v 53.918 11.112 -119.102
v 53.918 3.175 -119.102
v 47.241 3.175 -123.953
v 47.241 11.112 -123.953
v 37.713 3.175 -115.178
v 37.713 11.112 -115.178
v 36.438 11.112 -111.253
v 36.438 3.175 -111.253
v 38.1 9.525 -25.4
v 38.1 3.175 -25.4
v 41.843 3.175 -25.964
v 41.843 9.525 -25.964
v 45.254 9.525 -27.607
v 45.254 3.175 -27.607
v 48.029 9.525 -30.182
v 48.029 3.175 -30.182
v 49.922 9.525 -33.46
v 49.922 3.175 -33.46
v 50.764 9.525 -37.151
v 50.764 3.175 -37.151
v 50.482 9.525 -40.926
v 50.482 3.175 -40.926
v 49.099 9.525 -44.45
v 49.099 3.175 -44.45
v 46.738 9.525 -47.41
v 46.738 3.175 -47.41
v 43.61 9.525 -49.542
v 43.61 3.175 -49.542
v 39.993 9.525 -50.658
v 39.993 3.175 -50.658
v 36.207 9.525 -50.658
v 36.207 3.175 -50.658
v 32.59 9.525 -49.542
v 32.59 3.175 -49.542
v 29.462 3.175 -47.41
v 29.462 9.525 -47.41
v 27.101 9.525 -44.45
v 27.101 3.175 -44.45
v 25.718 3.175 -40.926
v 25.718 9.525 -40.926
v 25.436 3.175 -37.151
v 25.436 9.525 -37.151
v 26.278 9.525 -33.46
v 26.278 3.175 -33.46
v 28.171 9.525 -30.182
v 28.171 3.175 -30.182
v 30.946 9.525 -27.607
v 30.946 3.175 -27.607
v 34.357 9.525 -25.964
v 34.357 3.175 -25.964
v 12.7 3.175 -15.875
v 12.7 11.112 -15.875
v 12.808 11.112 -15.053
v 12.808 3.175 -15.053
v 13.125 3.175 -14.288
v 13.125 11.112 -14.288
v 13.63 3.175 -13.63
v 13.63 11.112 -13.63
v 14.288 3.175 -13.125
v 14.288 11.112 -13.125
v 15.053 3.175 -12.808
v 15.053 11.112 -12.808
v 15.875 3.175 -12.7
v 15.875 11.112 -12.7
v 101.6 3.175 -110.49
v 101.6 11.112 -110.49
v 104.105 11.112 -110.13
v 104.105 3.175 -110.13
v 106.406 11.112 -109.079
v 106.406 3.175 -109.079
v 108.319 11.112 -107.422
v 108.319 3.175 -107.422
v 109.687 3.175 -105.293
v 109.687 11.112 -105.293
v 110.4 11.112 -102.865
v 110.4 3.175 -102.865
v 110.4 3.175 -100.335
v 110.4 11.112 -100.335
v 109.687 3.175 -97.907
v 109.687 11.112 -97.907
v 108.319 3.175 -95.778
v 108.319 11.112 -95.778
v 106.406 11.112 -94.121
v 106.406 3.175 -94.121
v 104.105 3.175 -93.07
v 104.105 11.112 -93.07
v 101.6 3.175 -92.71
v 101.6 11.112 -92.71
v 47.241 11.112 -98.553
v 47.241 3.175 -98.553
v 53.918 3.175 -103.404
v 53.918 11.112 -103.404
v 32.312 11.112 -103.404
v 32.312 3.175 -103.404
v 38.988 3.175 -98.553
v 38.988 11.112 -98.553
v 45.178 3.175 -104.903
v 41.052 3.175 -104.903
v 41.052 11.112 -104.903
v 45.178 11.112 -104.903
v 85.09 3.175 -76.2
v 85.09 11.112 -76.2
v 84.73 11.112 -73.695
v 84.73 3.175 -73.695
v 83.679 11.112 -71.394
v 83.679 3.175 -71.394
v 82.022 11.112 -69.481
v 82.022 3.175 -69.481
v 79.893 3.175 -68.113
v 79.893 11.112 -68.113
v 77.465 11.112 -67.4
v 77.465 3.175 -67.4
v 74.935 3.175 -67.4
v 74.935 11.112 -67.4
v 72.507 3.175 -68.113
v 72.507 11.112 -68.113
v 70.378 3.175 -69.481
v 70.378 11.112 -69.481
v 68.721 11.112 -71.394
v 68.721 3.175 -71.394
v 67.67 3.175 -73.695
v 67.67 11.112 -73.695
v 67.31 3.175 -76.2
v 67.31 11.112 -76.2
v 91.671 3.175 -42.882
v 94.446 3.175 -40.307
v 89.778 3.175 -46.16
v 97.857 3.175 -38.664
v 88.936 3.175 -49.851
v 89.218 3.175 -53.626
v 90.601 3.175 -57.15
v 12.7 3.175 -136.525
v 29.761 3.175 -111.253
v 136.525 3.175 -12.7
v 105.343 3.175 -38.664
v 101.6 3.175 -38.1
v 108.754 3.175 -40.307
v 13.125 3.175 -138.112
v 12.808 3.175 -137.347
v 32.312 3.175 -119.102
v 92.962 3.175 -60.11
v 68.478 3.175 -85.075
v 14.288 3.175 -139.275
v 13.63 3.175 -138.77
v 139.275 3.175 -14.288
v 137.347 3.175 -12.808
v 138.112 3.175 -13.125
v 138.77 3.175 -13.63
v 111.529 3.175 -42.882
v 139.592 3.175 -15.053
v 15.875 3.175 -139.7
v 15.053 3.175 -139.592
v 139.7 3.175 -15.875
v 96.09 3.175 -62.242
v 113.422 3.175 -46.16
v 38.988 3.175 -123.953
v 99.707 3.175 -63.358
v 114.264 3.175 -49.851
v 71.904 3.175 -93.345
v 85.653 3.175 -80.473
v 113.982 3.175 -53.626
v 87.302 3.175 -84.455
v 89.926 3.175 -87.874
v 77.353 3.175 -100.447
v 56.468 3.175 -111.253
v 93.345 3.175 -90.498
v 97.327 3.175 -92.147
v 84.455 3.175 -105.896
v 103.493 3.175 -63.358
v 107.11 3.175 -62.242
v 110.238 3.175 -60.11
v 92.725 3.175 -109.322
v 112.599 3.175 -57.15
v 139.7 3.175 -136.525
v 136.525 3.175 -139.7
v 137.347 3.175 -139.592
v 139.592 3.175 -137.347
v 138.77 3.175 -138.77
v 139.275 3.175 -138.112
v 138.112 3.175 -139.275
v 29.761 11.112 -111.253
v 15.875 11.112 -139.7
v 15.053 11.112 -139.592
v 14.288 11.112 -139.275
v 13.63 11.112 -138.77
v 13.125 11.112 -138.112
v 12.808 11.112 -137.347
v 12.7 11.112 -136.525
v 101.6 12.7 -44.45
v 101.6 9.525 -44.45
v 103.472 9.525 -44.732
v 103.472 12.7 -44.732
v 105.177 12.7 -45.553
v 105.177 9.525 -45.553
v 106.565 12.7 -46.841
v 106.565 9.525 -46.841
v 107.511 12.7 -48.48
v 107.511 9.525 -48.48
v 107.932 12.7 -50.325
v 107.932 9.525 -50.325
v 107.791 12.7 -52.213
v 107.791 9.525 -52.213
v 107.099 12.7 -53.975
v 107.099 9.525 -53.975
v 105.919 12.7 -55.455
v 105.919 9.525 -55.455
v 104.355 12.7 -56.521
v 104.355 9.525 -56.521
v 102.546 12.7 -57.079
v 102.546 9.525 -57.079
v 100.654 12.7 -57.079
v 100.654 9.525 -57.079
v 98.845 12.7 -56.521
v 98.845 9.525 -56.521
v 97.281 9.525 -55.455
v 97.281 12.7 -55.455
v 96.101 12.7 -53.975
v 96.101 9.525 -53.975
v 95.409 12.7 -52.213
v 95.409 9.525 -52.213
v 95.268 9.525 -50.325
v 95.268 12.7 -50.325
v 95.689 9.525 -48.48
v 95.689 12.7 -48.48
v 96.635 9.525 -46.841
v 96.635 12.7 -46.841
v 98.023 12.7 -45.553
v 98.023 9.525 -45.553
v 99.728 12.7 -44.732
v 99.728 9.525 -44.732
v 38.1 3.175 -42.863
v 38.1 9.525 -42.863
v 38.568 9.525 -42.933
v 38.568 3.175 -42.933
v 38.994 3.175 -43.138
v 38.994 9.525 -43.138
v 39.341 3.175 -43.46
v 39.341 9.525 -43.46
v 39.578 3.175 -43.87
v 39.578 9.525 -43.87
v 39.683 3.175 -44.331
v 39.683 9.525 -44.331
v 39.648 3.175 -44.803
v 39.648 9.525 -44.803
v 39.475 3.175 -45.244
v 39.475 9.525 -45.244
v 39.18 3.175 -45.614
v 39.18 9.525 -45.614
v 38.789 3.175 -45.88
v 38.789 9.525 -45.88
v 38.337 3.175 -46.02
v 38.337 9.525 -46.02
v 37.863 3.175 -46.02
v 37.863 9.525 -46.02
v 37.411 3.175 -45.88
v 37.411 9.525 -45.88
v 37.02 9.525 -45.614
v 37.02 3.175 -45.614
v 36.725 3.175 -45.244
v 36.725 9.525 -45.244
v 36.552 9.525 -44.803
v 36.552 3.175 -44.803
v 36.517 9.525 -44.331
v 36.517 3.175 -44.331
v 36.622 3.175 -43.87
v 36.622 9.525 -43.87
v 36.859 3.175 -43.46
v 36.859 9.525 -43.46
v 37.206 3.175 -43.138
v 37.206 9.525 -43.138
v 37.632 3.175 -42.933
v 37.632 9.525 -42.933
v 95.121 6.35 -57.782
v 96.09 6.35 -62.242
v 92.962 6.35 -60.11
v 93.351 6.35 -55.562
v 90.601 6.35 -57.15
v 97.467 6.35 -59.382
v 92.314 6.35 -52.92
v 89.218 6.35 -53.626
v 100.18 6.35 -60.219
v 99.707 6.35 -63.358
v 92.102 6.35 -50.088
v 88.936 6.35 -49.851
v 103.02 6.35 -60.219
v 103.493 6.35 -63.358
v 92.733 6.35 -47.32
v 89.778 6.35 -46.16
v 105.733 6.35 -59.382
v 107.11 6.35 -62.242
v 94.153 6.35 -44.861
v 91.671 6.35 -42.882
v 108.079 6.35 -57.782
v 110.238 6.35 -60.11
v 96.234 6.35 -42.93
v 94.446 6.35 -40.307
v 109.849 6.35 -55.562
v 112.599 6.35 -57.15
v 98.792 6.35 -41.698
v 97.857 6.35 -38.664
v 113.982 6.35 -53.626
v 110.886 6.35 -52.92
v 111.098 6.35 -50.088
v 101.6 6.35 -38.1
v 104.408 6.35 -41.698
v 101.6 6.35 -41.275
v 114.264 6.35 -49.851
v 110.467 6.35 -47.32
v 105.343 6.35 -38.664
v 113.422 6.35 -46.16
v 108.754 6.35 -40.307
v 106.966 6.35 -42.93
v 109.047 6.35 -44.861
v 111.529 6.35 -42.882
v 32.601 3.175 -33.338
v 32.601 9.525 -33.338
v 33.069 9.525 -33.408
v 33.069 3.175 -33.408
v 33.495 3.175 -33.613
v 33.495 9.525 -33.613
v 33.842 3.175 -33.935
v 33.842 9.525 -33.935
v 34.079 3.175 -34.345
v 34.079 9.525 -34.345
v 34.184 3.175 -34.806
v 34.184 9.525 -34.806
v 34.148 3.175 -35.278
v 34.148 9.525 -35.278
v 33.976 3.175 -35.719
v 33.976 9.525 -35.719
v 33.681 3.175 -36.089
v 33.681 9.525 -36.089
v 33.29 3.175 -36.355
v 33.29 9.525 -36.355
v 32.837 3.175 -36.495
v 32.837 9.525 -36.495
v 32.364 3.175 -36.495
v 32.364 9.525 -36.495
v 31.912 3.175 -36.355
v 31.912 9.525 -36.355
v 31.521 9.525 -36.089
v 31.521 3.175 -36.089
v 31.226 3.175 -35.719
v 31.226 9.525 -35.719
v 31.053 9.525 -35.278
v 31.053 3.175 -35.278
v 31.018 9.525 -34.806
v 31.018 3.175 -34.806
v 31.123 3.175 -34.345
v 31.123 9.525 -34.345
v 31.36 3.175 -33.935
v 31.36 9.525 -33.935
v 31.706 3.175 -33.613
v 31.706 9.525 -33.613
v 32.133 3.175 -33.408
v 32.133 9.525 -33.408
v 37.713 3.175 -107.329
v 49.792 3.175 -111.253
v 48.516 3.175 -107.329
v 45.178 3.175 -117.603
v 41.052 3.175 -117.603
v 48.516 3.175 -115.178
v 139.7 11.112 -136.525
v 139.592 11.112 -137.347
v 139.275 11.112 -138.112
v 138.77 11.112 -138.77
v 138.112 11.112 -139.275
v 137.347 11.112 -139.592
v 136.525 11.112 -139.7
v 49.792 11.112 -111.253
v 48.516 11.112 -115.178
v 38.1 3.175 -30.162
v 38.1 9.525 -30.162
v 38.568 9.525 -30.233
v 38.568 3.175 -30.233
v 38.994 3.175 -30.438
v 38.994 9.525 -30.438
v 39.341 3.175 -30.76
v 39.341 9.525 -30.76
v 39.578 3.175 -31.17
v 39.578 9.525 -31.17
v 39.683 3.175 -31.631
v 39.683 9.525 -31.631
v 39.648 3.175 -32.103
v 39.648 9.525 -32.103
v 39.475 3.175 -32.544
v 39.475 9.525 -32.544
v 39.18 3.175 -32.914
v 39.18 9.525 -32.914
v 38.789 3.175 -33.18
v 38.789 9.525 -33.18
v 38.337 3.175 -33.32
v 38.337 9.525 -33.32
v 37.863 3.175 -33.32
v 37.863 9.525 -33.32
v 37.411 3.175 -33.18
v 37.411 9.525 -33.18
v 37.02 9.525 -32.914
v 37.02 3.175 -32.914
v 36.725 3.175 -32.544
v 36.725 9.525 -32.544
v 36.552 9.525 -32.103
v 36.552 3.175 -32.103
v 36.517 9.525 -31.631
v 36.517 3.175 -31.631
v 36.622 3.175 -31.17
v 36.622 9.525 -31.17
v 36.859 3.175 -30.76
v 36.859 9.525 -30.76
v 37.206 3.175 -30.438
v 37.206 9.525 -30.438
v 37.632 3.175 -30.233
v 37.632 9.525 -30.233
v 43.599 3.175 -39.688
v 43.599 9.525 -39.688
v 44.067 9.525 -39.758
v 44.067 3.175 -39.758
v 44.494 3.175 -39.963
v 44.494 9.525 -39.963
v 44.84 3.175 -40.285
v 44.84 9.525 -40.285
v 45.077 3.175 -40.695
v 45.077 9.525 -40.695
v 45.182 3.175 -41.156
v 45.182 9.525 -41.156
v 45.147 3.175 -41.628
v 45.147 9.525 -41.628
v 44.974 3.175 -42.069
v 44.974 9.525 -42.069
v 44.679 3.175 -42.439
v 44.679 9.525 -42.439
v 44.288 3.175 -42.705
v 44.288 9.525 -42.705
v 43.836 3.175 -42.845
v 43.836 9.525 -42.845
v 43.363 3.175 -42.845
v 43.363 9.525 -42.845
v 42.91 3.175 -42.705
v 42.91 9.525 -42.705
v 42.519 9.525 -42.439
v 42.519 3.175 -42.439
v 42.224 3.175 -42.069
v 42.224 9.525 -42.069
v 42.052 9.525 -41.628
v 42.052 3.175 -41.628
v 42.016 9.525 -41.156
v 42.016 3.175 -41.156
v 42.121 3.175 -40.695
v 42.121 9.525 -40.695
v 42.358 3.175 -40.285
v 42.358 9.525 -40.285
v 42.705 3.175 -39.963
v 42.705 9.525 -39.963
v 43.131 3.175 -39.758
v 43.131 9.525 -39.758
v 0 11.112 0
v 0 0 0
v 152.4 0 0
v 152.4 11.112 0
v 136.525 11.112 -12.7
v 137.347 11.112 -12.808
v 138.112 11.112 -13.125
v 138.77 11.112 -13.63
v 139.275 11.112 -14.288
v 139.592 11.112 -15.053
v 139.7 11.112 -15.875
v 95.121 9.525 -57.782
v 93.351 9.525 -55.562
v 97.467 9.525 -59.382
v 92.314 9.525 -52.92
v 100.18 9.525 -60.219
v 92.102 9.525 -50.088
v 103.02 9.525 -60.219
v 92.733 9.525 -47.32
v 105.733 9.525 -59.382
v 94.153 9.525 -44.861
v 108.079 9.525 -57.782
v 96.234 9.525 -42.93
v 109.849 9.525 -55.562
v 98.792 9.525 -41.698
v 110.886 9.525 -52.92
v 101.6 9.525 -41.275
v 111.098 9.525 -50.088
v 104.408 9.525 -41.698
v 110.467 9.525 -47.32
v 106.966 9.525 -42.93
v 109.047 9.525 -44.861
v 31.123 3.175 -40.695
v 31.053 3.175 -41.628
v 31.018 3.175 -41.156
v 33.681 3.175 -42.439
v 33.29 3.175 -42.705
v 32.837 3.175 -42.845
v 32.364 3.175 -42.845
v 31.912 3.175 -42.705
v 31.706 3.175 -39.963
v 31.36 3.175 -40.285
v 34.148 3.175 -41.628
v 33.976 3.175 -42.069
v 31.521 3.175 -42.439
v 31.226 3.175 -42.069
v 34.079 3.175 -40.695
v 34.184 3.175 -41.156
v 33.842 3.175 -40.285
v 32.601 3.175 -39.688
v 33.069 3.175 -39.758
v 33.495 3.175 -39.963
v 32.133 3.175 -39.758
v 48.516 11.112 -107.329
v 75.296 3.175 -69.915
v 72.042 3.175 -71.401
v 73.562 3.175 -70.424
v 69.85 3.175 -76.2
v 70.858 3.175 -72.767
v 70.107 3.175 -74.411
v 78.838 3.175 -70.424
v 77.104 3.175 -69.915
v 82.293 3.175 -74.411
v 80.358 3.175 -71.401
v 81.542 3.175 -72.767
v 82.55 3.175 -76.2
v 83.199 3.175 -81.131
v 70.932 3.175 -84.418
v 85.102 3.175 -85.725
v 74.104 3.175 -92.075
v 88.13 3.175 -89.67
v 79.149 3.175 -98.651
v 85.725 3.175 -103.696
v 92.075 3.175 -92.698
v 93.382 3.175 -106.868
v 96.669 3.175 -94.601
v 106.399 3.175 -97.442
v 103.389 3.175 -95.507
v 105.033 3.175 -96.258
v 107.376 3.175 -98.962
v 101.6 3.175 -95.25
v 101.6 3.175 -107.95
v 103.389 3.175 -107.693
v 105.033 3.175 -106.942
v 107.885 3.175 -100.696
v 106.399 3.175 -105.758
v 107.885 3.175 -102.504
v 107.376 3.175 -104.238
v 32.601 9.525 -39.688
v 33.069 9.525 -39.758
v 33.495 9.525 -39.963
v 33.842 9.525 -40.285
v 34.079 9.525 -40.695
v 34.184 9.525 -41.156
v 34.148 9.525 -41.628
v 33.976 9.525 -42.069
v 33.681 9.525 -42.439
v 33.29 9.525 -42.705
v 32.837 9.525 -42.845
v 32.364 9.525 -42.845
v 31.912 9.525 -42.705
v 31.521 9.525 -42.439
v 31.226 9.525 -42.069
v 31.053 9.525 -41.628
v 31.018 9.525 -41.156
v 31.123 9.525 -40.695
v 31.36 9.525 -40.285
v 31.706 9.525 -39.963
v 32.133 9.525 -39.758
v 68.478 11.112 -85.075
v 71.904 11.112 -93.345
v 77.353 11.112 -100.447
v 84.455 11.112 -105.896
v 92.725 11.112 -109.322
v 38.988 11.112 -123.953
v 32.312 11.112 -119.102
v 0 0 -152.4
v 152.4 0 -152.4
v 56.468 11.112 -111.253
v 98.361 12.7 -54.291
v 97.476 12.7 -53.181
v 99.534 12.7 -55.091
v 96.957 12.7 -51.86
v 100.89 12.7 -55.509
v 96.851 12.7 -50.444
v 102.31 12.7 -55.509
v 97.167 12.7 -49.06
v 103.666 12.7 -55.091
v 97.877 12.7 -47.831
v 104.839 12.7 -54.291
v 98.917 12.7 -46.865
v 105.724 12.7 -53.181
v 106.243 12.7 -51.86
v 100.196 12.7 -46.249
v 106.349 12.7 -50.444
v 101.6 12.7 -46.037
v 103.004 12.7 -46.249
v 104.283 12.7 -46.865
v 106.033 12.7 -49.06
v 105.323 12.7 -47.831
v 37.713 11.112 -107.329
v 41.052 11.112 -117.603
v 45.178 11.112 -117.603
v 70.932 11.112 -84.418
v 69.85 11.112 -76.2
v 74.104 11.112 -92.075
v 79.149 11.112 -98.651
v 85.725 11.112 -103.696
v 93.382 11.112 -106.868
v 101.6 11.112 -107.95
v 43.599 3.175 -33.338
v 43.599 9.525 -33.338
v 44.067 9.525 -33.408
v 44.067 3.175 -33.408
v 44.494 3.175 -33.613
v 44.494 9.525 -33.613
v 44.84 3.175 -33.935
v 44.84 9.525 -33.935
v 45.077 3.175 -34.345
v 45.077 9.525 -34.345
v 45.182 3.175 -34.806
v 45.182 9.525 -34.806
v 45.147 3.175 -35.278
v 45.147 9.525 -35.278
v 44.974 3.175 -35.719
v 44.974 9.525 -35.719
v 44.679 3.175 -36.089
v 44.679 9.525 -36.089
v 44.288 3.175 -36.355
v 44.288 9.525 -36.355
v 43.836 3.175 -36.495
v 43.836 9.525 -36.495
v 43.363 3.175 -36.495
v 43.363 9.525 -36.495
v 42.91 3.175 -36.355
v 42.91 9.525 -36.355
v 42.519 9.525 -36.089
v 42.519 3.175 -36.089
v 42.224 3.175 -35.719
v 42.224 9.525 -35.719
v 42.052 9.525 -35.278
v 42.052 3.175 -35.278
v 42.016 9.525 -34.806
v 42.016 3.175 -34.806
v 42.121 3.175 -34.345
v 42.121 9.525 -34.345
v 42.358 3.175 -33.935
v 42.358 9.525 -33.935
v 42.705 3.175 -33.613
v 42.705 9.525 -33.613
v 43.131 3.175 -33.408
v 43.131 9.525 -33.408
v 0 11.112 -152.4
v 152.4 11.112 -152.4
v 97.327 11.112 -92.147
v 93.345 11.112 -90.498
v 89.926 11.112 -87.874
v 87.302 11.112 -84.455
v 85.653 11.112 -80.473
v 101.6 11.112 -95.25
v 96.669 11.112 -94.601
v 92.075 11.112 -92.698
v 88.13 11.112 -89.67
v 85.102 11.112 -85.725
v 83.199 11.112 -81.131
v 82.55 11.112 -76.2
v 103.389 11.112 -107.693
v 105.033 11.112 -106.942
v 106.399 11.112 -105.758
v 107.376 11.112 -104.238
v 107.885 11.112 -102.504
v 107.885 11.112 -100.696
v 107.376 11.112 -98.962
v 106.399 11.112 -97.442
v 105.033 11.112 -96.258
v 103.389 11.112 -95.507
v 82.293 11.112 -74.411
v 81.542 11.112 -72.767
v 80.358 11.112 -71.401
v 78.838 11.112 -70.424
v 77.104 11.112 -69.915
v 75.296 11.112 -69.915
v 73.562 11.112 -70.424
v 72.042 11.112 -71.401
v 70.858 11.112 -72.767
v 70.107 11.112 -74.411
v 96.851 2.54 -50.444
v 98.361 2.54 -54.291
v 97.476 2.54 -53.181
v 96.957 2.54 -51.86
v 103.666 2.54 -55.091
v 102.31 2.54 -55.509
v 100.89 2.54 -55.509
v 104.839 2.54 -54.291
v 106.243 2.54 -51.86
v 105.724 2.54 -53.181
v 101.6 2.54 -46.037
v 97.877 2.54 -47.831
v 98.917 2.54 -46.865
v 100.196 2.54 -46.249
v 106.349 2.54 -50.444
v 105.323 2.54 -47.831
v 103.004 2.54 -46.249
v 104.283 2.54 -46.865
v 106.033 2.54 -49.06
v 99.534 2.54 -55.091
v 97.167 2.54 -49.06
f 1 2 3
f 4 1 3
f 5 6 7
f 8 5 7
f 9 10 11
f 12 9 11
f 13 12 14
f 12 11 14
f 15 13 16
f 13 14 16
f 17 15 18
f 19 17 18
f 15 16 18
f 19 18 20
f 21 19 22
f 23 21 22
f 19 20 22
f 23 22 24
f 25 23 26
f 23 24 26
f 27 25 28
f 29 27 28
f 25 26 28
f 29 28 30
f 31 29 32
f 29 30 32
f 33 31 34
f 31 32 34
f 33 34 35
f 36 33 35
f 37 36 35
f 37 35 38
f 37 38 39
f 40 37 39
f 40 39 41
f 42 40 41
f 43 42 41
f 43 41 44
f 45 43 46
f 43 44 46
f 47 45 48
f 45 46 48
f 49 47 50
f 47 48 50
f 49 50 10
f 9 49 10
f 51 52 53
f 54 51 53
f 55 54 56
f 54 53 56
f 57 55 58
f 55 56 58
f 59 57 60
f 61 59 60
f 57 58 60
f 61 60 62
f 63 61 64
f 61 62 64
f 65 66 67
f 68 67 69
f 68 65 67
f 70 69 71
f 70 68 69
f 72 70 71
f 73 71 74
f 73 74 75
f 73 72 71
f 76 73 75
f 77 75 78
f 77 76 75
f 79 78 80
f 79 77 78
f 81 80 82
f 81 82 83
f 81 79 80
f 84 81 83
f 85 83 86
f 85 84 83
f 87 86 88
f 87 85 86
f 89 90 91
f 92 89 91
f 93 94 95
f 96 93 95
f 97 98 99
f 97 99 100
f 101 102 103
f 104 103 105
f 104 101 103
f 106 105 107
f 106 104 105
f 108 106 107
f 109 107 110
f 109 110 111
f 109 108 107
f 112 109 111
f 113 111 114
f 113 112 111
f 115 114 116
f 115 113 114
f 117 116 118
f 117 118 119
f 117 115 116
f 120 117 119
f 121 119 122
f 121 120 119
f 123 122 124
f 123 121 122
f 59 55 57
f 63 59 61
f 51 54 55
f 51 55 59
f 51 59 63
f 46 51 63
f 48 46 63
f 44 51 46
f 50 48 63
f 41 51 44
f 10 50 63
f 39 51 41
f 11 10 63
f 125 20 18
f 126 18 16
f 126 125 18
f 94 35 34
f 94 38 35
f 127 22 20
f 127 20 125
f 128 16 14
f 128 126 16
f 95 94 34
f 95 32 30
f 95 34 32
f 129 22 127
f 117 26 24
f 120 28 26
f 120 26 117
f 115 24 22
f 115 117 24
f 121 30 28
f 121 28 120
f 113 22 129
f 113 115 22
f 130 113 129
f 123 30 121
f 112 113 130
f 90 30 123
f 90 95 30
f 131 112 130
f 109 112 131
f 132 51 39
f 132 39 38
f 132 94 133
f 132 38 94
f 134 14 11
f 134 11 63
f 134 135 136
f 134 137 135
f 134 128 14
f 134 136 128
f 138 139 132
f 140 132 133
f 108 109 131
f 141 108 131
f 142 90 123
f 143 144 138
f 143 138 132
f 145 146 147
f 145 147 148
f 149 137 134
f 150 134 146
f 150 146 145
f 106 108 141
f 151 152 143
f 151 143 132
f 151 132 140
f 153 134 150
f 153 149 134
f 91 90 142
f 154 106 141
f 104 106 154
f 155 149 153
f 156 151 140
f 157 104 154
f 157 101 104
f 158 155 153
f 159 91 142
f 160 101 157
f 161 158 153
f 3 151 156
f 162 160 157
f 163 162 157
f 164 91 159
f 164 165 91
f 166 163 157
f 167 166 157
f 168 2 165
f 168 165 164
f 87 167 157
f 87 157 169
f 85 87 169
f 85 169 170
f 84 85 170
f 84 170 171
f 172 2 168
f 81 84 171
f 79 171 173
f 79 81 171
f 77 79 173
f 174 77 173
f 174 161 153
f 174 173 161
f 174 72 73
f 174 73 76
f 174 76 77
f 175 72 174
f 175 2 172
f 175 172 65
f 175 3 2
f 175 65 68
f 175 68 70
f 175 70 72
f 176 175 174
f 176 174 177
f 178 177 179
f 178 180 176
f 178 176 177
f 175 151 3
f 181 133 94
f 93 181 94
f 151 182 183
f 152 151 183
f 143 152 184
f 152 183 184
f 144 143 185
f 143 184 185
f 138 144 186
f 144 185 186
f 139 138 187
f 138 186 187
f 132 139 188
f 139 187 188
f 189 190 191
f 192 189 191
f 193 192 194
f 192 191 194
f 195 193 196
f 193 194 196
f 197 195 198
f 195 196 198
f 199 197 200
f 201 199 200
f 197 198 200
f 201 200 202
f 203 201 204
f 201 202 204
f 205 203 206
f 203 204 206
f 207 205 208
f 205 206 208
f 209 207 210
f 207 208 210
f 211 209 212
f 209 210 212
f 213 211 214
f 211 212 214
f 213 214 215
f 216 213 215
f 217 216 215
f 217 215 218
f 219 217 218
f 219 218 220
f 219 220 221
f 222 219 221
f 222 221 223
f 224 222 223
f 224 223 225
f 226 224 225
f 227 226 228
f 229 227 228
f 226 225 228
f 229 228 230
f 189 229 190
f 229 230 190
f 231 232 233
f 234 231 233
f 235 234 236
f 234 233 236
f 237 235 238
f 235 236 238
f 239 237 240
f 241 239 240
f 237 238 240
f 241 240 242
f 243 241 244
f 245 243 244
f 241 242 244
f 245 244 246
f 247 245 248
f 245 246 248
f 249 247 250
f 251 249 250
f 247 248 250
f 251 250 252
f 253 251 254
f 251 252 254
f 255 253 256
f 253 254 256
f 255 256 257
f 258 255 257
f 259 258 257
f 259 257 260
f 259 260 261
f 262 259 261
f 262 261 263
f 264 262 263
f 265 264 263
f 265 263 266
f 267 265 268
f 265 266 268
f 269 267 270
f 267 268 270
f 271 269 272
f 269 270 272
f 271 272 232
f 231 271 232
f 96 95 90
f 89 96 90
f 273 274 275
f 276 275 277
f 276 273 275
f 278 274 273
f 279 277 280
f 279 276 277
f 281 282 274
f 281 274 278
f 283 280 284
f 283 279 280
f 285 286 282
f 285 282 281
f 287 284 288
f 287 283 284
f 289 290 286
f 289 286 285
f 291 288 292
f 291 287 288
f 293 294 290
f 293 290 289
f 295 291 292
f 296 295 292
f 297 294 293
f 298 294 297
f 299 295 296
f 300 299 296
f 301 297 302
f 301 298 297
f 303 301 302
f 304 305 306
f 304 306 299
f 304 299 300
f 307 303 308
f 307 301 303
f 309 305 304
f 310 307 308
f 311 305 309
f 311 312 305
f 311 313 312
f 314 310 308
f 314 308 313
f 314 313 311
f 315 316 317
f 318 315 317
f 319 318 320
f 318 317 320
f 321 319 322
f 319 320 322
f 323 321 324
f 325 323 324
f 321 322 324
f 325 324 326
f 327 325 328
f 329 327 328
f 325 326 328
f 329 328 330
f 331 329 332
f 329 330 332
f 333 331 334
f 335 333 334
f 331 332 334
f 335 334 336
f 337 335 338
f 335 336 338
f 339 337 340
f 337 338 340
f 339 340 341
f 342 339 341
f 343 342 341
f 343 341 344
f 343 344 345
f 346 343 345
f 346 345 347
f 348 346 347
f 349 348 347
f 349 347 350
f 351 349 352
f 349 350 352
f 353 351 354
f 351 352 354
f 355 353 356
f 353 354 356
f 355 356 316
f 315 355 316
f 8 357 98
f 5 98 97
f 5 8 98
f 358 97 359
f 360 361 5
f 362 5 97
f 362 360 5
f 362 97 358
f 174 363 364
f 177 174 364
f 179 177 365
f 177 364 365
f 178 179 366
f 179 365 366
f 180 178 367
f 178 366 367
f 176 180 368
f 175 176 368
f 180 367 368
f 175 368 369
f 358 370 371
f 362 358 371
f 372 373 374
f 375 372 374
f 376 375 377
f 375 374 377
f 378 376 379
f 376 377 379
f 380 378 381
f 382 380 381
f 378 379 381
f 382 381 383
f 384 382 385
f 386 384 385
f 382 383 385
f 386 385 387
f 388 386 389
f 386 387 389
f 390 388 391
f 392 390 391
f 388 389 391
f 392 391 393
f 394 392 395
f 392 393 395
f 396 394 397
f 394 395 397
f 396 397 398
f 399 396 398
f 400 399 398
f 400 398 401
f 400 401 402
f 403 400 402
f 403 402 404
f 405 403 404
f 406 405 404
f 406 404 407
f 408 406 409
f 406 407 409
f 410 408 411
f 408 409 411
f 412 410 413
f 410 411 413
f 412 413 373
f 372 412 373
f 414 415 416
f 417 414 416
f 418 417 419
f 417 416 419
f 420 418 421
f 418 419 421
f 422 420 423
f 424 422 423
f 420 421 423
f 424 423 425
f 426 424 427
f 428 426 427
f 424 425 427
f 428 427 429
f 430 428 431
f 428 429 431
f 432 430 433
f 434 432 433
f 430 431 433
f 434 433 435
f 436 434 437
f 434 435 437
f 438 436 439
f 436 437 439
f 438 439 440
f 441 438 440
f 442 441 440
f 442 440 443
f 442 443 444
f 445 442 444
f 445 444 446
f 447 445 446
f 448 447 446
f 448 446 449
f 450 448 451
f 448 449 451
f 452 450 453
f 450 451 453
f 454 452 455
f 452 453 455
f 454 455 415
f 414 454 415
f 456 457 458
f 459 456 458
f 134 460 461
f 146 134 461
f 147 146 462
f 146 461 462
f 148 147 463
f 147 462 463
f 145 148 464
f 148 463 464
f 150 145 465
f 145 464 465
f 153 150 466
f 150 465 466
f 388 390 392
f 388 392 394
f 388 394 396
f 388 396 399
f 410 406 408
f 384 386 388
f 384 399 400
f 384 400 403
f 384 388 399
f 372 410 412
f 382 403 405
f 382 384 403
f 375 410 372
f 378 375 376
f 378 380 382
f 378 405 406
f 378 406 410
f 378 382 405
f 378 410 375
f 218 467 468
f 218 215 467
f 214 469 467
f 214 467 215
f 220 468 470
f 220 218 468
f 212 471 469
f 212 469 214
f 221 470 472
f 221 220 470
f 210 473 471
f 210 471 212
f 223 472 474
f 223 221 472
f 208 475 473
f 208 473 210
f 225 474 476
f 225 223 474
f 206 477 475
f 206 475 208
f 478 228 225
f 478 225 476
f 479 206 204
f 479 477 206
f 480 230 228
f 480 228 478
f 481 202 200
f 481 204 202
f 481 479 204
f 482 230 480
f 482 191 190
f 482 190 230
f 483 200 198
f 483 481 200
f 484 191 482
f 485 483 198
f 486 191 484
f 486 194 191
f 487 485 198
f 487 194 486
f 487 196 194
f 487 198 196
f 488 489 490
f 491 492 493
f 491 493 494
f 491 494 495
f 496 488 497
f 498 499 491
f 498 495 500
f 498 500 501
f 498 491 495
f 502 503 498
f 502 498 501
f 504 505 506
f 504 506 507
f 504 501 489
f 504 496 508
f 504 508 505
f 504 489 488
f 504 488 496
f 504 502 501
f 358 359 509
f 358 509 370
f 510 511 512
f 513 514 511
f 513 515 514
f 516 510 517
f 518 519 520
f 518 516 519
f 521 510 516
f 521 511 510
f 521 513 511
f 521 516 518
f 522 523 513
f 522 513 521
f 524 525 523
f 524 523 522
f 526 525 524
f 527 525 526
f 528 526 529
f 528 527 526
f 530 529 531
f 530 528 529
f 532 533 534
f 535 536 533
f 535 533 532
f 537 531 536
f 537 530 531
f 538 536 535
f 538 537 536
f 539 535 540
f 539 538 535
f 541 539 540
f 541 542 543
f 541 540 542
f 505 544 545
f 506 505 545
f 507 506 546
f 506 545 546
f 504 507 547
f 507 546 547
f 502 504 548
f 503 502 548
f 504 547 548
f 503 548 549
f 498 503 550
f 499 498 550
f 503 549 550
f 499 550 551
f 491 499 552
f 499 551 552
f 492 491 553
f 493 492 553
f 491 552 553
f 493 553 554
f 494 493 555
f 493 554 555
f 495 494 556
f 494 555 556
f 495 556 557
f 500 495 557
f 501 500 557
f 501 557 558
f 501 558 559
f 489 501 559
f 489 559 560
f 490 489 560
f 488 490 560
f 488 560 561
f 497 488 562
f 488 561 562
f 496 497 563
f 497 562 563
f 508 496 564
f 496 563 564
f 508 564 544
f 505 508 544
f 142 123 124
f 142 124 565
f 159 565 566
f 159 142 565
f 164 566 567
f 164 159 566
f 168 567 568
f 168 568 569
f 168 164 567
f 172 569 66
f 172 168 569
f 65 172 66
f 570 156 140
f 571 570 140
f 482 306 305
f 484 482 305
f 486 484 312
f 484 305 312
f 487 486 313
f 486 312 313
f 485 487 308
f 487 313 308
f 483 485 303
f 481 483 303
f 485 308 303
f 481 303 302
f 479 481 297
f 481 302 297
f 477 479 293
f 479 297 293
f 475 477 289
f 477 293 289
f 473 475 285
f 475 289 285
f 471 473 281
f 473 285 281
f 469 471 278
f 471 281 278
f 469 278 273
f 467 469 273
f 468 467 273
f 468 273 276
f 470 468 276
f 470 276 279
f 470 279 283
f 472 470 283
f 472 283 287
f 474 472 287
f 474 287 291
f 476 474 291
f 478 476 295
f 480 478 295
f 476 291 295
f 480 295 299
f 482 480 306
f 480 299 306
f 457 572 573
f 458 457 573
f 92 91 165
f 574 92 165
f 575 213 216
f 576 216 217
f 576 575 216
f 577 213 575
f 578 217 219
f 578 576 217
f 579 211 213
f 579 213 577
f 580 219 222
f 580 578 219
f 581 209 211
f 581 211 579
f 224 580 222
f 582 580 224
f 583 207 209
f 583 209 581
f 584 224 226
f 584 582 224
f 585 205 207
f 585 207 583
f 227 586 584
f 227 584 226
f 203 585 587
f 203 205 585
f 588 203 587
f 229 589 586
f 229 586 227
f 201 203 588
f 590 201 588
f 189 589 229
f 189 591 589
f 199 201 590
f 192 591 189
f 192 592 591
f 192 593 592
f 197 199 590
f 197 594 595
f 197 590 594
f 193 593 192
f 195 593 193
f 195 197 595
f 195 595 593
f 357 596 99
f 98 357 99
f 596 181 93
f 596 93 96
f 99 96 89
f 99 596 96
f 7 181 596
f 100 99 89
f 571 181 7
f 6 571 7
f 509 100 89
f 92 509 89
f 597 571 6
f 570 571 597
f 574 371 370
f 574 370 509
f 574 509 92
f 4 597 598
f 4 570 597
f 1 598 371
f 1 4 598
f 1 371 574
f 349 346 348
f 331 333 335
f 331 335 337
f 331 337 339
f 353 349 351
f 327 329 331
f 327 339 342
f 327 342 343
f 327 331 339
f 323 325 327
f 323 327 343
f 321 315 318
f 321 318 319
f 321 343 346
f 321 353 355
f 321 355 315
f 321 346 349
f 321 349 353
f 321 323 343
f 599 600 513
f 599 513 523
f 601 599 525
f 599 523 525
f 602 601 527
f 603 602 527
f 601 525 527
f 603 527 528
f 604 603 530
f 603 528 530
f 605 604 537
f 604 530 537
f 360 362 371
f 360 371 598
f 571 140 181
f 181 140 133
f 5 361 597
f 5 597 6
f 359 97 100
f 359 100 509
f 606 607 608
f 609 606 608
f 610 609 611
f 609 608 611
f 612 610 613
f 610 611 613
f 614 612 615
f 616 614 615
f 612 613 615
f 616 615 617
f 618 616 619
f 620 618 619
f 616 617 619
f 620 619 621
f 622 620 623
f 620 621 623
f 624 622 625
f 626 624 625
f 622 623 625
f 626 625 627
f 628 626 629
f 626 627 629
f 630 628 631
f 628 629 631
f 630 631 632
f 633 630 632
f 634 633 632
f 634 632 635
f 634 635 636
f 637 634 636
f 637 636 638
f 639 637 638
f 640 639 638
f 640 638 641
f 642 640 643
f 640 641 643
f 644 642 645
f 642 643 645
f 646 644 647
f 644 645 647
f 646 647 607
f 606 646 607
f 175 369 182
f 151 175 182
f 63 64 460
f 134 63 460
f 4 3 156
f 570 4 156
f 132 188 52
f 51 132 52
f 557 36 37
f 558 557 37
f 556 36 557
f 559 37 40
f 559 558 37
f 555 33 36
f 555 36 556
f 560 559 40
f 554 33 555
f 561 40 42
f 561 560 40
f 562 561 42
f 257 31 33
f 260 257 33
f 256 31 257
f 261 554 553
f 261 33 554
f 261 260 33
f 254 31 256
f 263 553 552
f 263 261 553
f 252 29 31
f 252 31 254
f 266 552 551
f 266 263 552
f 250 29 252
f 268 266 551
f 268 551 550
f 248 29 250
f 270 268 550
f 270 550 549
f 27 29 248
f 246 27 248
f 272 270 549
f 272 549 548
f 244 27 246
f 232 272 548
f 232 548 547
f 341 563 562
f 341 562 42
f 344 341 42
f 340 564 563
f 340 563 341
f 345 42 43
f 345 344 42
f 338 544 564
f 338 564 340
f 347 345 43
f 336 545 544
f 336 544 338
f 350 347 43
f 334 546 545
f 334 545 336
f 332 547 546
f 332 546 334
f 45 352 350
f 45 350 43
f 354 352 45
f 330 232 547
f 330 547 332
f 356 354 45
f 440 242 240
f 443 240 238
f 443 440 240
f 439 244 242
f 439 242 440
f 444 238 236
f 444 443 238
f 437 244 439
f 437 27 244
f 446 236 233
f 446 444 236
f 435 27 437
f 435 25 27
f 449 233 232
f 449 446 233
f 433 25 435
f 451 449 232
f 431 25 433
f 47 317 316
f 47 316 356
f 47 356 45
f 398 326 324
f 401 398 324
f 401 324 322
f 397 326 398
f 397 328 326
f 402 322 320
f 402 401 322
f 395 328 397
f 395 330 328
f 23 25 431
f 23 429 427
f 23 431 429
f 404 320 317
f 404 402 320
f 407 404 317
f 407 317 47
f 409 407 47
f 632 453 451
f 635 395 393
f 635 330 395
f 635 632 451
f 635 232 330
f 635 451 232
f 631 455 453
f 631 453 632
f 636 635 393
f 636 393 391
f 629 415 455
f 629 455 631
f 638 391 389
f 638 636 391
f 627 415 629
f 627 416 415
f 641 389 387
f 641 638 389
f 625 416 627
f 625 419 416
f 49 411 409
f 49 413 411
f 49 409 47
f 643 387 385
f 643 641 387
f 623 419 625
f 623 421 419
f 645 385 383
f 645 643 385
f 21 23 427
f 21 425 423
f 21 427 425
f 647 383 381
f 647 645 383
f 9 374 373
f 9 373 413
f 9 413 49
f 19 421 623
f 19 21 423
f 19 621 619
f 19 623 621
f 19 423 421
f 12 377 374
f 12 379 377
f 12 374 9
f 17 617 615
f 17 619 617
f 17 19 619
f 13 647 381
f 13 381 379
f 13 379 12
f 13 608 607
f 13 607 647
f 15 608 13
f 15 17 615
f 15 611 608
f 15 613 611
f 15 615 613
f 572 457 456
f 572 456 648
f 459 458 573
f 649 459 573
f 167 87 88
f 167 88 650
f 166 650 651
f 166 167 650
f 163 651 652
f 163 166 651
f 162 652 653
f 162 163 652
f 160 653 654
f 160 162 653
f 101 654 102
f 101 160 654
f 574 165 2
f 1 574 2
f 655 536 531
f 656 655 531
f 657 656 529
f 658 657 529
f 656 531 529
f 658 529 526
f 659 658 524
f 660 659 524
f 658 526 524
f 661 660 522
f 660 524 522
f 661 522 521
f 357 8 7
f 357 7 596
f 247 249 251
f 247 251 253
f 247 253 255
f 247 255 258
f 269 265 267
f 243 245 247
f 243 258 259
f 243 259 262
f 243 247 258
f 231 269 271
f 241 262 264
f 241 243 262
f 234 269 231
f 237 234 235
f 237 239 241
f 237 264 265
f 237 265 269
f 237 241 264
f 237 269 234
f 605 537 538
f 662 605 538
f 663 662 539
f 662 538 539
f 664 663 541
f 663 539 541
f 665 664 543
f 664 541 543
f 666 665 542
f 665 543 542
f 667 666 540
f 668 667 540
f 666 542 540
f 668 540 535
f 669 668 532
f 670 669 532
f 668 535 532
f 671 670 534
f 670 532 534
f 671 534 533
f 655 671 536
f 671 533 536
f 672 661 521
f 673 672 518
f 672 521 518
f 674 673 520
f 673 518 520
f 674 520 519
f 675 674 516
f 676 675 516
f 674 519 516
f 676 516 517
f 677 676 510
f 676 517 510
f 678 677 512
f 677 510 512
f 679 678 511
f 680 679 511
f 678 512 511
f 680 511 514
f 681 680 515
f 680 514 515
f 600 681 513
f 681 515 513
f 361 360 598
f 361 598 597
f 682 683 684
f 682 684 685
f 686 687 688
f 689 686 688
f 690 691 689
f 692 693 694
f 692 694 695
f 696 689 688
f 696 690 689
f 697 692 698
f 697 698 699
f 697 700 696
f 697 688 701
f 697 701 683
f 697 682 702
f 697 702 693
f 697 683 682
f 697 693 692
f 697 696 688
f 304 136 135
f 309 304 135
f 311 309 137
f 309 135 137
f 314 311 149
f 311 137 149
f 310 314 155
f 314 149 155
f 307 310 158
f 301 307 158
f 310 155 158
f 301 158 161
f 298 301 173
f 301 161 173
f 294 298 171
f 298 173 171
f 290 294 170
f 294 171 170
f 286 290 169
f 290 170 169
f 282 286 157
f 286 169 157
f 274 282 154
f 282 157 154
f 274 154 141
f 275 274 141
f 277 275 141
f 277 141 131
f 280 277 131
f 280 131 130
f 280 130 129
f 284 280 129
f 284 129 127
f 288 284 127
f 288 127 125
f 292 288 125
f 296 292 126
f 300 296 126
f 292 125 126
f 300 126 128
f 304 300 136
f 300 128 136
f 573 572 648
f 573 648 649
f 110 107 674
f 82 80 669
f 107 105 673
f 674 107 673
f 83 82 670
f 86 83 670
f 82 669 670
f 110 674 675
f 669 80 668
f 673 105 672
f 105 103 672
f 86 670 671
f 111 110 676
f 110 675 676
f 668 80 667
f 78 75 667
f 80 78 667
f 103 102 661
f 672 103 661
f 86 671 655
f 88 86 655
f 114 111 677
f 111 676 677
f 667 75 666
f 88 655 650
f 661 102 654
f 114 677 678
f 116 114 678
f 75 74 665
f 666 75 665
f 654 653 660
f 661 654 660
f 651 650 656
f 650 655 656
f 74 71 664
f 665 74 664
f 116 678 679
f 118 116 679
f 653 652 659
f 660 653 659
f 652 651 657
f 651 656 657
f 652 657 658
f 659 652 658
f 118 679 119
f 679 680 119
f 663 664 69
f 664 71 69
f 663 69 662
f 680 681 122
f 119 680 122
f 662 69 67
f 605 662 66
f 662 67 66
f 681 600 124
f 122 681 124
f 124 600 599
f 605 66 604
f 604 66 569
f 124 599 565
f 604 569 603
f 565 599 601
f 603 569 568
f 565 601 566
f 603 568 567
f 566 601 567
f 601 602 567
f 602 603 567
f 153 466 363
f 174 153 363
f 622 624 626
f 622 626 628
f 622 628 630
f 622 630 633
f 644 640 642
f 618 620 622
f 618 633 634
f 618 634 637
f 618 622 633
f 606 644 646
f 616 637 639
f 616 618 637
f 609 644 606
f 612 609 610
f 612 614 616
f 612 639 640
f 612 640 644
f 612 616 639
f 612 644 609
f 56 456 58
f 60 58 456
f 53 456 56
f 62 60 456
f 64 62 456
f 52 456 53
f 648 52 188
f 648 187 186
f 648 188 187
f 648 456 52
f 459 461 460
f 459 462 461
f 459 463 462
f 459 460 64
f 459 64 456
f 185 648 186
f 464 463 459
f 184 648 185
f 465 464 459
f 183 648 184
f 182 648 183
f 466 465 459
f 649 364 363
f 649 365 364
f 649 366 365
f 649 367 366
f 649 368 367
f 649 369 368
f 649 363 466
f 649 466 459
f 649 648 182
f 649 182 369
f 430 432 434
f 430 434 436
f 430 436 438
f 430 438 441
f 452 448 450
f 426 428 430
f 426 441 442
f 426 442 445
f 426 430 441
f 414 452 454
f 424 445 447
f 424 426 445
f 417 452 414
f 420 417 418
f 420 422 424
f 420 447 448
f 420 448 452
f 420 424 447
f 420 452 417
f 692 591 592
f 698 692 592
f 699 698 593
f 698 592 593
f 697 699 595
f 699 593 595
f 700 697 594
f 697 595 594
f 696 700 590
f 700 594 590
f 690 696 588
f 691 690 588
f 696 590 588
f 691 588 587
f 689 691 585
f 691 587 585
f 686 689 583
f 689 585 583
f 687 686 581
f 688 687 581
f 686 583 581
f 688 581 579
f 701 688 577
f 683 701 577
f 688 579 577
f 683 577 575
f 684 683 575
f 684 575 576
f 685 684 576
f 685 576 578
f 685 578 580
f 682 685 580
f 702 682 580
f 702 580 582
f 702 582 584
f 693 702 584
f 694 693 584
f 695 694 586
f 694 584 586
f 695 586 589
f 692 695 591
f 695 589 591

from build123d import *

# Parameters (mm, degrees)
SKETCH1_W           = 152.4
SKETCH1_H           = 152.4
BOSS_EXTRUDE1_DEPTH = 11.1125
CUT_EXTRUDE1_DEPTH  = 7.9375
SKETCH3_R           = 12.7
BOSS_EXTRUDE2_DEPTH = 6.35
SKETCH4_R           = 1.5875
CUT_EXTRUDE2_DEPTH  = 6.35
BOSS_EXTRUDE3_DEPTH = 7.9375
EXTRUDE_THIN6_DEPTH = 7.9375
SKETCH8_R           = 12.7
BOSS_EXTRUDE4_DEPTH = 3.175
SKETCH9_R           = 9.525
BOSS_EXTRUDE5_DEPTH = 3.175
SKETCH10_R          = 6.35
BOSS_EXTRUDE6_DEPTH = 3.175
SKETCH11_R          = 4.7625
CUT_EXTRUDE3_DEPTH  = 10.16


with BuildPart() as part:
    # Sketch1 → Boss-Extrude1 (new body)
    with BuildSketch(Plane(origin=(0, 0, 0), x_dir=(1, 0, 0), z_dir=(0, 1, 0))):
        with Locations((76.2, 76.2)):
            Rectangle(SKETCH1_W, SKETCH1_H)
    extrude(amount=BOSS_EXTRUDE1_DEPTH)

    # Sketch2 → Cut-Extrude1 (cut)
    with BuildSketch(Plane(origin=(0, 11.1125, 0), x_dir=(1, 0, 0), z_dir=(0, 1, 0))):
        with BuildLine():
            Line((136.525, 139.7), (15.875, 139.7))
            ThreePointArc((15.875, 139.7), (13.62993597, 138.77006403), (12.7, 136.525))
            Line((12.7, 136.525), (12.7, 15.875))
            ThreePointArc((12.7, 15.875), (13.62993597, 13.62993597), (15.875, 12.7))
            Line((15.875, 12.7), (136.525, 12.7))
            ThreePointArc((136.525, 12.7), (138.77006403, 13.62993597), (139.7, 15.875))
            Line((139.7, 15.875), (139.7, 136.525))
            ThreePointArc((139.7, 136.525), (138.77006403, 138.77006403), (136.525, 139.7))
        make_face()
    extrude(amount=-CUT_EXTRUDE1_DEPTH, mode=Mode.SUBTRACT)

    # Sketch3 → Boss-Extrude2 (add)
    with BuildSketch(Plane(origin=(0, 3.175, 0), x_dir=(1, 0, 0), z_dir=(0, 1, 0))):
        with Locations(Location((38.1, 38.1, 0), (0, 0, 270))):
            Circle(SKETCH3_R)
    extrude(amount=BOSS_EXTRUDE2_DEPTH)

    # Sketch4 → Cut-Extrude2 (cut)
    with BuildSketch(Plane(origin=(0, 9.525, 0), x_dir=(1, 0, 0), z_dir=(0, 1, 0))):
        with Locations(Location((38.1, 44.45, 0), (0, 0, 270))):
            Circle(SKETCH4_R)
        with Locations(Location((43.599261314, 41.275, 0), (0, 0, 270))):
            Circle(SKETCH4_R)
        with Locations(Location((43.599261314, 34.925, 0), (0, 0, 270))):
            Circle(SKETCH4_R)
        with Locations(Location((38.1, 31.75, 0), (0, 0, 270))):
            Circle(SKETCH4_R)
        with Locations(Location((32.600738686, 34.925, 0), (0, 0, 270))):
            Circle(SKETCH4_R)
        with Locations(Location((32.600738686, 41.275, 0), (0, 0, 270))):
            Circle(SKETCH4_R)
    extrude(amount=-CUT_EXTRUDE2_DEPTH, mode=Mode.SUBTRACT)

    # Sketch5 → Boss-Extrude3 (add)
    with BuildSketch(Plane(origin=(0, 3.175, 0), x_dir=(1, 0, 0), z_dir=(0, 1, 0))):
        Polygon((53.918108532, 103.404018082), (56.468413513, 111.25304974), (53.918108532, 119.102081397), (47.241323408, 123.95304974), (38.988363123, 123.95304974), (32.311578, 119.102081397), (29.761273018, 111.25304974), (32.311578, 103.404018082), (38.988363123, 98.55304974), (47.241323408, 98.55304974), align=None)
        Polygon((49.79162839, 111.25304974), (48.516475899, 115.177565568), (45.178083337, 117.60304974), (41.051603195, 117.60304974), (37.713210633, 115.177565568), (36.438058142, 111.25304974), (37.713210633, 107.328533911), (41.051603195, 104.90304974), (45.178083337, 104.90304974), (48.516475899, 107.328533911), align=None, mode=Mode.SUBTRACT)
    extrude(amount=BOSS_EXTRUDE3_DEPTH)

    # Sketch6 → Extrude-Thin6 (add)
    with BuildSketch(Plane(origin=(0, 3.175, 0), x_dir=(1, 0, 0), z_dir=(0, 1, 0))):
        with BuildLine():
            ThreePointArc((101.6, 92.71), (89.925667043, 87.874332957), (85.09, 76.2))
            ThreePointArc((85.09, 76.2), (76.2, 67.31), (67.31, 76.2))
            ThreePointArc((67.31, 76.2), (77.353308473, 100.446691527), (101.6, 110.49))
            ThreePointArc((101.6, 110.49), (110.49, 101.6), (101.6, 92.71))
        make_face()
        with BuildLine():
            ThreePointArc((101.6, 95.25), (88.129615818, 89.670384182), (82.55, 76.2))
            ThreePointArc((82.55, 76.2), (76.2, 69.85), (69.85, 76.2))
            ThreePointArc((69.85, 76.2), (79.149359697, 98.650640303), (101.6, 107.95))
            ThreePointArc((101.6, 107.95), (107.95, 101.6), (101.6, 95.25))
        make_face(mode=Mode.SUBTRACT)
    extrude(amount=EXTRUDE_THIN6_DEPTH)

    # Sketch8 → Boss-Extrude4 (add)
    with BuildSketch(Plane(origin=(0, 3.175, 0), x_dir=(1, 0, 0), z_dir=(0, 1, 0))):
        with Locations(Location((101.6, 50.8, 0), (0, 0, 270))):
            Circle(SKETCH8_R)
    extrude(amount=BOSS_EXTRUDE4_DEPTH)

    # Sketch9 → Boss-Extrude5 (add)
    with BuildSketch(Plane(origin=(0, 6.35, 0), x_dir=(1, 0, 0), z_dir=(0, 1, 0))):
        with Locations(Location((101.6, 50.8, 0), (0, 0, 270))):
            Circle(SKETCH9_R)
    extrude(amount=BOSS_EXTRUDE5_DEPTH)

    # Sketch10 → Boss-Extrude6 (add)
    with BuildSketch(Plane(origin=(0, 9.525, 0), x_dir=(1, 0, 0), z_dir=(0, 1, 0))):
        with Locations(Location((101.6, 50.8, 0), (0, 0, 270))):
            Circle(SKETCH10_R)
    extrude(amount=BOSS_EXTRUDE6_DEPTH)

    # Sketch11 → Cut-Extrude3 (cut)
    with BuildSketch(Plane(origin=(0, 12.7, 0), x_dir=(1, 0, 0), z_dir=(0, 1, 0))):
        with Locations(Location((101.6, 50.8, 0), (0, 0, 270))):
            Circle(SKETCH11_R)
    extrude(amount=-CUT_EXTRUDE3_DEPTH, mode=Mode.SUBTRACT)


solid = part.part
